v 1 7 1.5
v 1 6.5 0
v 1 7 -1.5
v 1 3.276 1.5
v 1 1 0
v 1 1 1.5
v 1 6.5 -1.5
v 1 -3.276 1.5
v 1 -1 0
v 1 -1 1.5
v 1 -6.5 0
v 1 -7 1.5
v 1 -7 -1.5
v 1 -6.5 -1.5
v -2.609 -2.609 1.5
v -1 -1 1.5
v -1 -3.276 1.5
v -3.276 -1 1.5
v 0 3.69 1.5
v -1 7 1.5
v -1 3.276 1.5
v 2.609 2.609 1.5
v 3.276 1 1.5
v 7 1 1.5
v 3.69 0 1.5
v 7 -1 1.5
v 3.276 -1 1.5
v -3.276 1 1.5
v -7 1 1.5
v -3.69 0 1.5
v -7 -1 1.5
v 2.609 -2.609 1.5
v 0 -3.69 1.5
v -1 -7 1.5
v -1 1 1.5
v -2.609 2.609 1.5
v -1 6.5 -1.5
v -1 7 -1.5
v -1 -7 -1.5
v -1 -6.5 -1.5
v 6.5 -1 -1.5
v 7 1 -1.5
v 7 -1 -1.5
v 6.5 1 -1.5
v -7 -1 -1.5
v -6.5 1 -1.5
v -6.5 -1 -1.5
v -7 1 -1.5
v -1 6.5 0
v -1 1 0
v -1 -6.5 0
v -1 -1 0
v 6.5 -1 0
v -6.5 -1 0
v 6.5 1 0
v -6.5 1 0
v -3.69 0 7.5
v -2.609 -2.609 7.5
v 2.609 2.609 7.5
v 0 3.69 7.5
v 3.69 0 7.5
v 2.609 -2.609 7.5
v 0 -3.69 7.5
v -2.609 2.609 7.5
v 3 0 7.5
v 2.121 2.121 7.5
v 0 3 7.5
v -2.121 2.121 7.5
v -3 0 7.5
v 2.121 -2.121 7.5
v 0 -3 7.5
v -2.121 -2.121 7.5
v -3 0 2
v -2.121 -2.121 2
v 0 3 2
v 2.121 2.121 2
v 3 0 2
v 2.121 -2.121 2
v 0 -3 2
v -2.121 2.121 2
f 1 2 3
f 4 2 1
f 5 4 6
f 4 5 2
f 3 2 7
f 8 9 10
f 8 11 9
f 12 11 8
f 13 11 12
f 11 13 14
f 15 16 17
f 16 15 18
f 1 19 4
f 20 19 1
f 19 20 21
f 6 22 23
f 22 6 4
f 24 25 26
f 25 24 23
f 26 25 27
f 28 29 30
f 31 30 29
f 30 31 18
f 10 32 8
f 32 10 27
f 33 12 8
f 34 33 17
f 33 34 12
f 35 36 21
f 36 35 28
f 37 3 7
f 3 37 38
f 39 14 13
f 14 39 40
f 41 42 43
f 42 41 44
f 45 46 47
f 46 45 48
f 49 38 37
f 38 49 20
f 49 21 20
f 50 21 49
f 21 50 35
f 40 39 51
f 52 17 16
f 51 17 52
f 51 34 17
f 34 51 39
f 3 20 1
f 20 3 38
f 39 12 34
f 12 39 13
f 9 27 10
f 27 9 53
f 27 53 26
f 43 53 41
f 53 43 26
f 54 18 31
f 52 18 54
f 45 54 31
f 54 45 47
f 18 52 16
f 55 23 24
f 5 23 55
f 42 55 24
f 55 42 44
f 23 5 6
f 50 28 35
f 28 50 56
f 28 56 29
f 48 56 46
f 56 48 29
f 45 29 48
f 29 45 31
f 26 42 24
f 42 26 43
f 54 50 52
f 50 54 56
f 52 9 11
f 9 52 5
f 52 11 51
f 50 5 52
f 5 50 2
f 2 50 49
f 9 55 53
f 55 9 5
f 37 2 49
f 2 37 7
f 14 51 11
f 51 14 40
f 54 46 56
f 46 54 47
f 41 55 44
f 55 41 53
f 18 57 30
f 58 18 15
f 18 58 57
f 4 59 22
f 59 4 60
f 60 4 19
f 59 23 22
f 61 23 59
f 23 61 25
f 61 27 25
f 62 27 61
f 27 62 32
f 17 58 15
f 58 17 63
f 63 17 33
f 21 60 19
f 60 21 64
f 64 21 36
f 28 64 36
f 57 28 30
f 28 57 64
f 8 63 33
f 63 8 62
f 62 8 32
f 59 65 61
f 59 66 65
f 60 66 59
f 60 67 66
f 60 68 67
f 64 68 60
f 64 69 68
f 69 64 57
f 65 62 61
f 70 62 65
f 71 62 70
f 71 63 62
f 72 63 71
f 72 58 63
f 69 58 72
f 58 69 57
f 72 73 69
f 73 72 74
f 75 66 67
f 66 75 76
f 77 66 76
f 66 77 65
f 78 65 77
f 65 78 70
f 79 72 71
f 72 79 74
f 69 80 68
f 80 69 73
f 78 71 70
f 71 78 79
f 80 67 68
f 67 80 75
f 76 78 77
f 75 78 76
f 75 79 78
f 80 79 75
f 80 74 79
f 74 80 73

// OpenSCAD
difference(){
union(){
cube([2,14,3], center=true); rotate([90,90,0]) cube([3,14,2],center=true);
}

translate([0,0,-1]) cube([3,13,2],center=true);
translate([0,0,-1]) rotate([90,90,0]) cube([2,13,3],center=true);
}

difference(){
translate([0,0,1.5]) cylinder(h=6, r=3.69, $fn=8);
translate([0,0,2]) cylinder(h=6, r=3, $fn=8);
}
